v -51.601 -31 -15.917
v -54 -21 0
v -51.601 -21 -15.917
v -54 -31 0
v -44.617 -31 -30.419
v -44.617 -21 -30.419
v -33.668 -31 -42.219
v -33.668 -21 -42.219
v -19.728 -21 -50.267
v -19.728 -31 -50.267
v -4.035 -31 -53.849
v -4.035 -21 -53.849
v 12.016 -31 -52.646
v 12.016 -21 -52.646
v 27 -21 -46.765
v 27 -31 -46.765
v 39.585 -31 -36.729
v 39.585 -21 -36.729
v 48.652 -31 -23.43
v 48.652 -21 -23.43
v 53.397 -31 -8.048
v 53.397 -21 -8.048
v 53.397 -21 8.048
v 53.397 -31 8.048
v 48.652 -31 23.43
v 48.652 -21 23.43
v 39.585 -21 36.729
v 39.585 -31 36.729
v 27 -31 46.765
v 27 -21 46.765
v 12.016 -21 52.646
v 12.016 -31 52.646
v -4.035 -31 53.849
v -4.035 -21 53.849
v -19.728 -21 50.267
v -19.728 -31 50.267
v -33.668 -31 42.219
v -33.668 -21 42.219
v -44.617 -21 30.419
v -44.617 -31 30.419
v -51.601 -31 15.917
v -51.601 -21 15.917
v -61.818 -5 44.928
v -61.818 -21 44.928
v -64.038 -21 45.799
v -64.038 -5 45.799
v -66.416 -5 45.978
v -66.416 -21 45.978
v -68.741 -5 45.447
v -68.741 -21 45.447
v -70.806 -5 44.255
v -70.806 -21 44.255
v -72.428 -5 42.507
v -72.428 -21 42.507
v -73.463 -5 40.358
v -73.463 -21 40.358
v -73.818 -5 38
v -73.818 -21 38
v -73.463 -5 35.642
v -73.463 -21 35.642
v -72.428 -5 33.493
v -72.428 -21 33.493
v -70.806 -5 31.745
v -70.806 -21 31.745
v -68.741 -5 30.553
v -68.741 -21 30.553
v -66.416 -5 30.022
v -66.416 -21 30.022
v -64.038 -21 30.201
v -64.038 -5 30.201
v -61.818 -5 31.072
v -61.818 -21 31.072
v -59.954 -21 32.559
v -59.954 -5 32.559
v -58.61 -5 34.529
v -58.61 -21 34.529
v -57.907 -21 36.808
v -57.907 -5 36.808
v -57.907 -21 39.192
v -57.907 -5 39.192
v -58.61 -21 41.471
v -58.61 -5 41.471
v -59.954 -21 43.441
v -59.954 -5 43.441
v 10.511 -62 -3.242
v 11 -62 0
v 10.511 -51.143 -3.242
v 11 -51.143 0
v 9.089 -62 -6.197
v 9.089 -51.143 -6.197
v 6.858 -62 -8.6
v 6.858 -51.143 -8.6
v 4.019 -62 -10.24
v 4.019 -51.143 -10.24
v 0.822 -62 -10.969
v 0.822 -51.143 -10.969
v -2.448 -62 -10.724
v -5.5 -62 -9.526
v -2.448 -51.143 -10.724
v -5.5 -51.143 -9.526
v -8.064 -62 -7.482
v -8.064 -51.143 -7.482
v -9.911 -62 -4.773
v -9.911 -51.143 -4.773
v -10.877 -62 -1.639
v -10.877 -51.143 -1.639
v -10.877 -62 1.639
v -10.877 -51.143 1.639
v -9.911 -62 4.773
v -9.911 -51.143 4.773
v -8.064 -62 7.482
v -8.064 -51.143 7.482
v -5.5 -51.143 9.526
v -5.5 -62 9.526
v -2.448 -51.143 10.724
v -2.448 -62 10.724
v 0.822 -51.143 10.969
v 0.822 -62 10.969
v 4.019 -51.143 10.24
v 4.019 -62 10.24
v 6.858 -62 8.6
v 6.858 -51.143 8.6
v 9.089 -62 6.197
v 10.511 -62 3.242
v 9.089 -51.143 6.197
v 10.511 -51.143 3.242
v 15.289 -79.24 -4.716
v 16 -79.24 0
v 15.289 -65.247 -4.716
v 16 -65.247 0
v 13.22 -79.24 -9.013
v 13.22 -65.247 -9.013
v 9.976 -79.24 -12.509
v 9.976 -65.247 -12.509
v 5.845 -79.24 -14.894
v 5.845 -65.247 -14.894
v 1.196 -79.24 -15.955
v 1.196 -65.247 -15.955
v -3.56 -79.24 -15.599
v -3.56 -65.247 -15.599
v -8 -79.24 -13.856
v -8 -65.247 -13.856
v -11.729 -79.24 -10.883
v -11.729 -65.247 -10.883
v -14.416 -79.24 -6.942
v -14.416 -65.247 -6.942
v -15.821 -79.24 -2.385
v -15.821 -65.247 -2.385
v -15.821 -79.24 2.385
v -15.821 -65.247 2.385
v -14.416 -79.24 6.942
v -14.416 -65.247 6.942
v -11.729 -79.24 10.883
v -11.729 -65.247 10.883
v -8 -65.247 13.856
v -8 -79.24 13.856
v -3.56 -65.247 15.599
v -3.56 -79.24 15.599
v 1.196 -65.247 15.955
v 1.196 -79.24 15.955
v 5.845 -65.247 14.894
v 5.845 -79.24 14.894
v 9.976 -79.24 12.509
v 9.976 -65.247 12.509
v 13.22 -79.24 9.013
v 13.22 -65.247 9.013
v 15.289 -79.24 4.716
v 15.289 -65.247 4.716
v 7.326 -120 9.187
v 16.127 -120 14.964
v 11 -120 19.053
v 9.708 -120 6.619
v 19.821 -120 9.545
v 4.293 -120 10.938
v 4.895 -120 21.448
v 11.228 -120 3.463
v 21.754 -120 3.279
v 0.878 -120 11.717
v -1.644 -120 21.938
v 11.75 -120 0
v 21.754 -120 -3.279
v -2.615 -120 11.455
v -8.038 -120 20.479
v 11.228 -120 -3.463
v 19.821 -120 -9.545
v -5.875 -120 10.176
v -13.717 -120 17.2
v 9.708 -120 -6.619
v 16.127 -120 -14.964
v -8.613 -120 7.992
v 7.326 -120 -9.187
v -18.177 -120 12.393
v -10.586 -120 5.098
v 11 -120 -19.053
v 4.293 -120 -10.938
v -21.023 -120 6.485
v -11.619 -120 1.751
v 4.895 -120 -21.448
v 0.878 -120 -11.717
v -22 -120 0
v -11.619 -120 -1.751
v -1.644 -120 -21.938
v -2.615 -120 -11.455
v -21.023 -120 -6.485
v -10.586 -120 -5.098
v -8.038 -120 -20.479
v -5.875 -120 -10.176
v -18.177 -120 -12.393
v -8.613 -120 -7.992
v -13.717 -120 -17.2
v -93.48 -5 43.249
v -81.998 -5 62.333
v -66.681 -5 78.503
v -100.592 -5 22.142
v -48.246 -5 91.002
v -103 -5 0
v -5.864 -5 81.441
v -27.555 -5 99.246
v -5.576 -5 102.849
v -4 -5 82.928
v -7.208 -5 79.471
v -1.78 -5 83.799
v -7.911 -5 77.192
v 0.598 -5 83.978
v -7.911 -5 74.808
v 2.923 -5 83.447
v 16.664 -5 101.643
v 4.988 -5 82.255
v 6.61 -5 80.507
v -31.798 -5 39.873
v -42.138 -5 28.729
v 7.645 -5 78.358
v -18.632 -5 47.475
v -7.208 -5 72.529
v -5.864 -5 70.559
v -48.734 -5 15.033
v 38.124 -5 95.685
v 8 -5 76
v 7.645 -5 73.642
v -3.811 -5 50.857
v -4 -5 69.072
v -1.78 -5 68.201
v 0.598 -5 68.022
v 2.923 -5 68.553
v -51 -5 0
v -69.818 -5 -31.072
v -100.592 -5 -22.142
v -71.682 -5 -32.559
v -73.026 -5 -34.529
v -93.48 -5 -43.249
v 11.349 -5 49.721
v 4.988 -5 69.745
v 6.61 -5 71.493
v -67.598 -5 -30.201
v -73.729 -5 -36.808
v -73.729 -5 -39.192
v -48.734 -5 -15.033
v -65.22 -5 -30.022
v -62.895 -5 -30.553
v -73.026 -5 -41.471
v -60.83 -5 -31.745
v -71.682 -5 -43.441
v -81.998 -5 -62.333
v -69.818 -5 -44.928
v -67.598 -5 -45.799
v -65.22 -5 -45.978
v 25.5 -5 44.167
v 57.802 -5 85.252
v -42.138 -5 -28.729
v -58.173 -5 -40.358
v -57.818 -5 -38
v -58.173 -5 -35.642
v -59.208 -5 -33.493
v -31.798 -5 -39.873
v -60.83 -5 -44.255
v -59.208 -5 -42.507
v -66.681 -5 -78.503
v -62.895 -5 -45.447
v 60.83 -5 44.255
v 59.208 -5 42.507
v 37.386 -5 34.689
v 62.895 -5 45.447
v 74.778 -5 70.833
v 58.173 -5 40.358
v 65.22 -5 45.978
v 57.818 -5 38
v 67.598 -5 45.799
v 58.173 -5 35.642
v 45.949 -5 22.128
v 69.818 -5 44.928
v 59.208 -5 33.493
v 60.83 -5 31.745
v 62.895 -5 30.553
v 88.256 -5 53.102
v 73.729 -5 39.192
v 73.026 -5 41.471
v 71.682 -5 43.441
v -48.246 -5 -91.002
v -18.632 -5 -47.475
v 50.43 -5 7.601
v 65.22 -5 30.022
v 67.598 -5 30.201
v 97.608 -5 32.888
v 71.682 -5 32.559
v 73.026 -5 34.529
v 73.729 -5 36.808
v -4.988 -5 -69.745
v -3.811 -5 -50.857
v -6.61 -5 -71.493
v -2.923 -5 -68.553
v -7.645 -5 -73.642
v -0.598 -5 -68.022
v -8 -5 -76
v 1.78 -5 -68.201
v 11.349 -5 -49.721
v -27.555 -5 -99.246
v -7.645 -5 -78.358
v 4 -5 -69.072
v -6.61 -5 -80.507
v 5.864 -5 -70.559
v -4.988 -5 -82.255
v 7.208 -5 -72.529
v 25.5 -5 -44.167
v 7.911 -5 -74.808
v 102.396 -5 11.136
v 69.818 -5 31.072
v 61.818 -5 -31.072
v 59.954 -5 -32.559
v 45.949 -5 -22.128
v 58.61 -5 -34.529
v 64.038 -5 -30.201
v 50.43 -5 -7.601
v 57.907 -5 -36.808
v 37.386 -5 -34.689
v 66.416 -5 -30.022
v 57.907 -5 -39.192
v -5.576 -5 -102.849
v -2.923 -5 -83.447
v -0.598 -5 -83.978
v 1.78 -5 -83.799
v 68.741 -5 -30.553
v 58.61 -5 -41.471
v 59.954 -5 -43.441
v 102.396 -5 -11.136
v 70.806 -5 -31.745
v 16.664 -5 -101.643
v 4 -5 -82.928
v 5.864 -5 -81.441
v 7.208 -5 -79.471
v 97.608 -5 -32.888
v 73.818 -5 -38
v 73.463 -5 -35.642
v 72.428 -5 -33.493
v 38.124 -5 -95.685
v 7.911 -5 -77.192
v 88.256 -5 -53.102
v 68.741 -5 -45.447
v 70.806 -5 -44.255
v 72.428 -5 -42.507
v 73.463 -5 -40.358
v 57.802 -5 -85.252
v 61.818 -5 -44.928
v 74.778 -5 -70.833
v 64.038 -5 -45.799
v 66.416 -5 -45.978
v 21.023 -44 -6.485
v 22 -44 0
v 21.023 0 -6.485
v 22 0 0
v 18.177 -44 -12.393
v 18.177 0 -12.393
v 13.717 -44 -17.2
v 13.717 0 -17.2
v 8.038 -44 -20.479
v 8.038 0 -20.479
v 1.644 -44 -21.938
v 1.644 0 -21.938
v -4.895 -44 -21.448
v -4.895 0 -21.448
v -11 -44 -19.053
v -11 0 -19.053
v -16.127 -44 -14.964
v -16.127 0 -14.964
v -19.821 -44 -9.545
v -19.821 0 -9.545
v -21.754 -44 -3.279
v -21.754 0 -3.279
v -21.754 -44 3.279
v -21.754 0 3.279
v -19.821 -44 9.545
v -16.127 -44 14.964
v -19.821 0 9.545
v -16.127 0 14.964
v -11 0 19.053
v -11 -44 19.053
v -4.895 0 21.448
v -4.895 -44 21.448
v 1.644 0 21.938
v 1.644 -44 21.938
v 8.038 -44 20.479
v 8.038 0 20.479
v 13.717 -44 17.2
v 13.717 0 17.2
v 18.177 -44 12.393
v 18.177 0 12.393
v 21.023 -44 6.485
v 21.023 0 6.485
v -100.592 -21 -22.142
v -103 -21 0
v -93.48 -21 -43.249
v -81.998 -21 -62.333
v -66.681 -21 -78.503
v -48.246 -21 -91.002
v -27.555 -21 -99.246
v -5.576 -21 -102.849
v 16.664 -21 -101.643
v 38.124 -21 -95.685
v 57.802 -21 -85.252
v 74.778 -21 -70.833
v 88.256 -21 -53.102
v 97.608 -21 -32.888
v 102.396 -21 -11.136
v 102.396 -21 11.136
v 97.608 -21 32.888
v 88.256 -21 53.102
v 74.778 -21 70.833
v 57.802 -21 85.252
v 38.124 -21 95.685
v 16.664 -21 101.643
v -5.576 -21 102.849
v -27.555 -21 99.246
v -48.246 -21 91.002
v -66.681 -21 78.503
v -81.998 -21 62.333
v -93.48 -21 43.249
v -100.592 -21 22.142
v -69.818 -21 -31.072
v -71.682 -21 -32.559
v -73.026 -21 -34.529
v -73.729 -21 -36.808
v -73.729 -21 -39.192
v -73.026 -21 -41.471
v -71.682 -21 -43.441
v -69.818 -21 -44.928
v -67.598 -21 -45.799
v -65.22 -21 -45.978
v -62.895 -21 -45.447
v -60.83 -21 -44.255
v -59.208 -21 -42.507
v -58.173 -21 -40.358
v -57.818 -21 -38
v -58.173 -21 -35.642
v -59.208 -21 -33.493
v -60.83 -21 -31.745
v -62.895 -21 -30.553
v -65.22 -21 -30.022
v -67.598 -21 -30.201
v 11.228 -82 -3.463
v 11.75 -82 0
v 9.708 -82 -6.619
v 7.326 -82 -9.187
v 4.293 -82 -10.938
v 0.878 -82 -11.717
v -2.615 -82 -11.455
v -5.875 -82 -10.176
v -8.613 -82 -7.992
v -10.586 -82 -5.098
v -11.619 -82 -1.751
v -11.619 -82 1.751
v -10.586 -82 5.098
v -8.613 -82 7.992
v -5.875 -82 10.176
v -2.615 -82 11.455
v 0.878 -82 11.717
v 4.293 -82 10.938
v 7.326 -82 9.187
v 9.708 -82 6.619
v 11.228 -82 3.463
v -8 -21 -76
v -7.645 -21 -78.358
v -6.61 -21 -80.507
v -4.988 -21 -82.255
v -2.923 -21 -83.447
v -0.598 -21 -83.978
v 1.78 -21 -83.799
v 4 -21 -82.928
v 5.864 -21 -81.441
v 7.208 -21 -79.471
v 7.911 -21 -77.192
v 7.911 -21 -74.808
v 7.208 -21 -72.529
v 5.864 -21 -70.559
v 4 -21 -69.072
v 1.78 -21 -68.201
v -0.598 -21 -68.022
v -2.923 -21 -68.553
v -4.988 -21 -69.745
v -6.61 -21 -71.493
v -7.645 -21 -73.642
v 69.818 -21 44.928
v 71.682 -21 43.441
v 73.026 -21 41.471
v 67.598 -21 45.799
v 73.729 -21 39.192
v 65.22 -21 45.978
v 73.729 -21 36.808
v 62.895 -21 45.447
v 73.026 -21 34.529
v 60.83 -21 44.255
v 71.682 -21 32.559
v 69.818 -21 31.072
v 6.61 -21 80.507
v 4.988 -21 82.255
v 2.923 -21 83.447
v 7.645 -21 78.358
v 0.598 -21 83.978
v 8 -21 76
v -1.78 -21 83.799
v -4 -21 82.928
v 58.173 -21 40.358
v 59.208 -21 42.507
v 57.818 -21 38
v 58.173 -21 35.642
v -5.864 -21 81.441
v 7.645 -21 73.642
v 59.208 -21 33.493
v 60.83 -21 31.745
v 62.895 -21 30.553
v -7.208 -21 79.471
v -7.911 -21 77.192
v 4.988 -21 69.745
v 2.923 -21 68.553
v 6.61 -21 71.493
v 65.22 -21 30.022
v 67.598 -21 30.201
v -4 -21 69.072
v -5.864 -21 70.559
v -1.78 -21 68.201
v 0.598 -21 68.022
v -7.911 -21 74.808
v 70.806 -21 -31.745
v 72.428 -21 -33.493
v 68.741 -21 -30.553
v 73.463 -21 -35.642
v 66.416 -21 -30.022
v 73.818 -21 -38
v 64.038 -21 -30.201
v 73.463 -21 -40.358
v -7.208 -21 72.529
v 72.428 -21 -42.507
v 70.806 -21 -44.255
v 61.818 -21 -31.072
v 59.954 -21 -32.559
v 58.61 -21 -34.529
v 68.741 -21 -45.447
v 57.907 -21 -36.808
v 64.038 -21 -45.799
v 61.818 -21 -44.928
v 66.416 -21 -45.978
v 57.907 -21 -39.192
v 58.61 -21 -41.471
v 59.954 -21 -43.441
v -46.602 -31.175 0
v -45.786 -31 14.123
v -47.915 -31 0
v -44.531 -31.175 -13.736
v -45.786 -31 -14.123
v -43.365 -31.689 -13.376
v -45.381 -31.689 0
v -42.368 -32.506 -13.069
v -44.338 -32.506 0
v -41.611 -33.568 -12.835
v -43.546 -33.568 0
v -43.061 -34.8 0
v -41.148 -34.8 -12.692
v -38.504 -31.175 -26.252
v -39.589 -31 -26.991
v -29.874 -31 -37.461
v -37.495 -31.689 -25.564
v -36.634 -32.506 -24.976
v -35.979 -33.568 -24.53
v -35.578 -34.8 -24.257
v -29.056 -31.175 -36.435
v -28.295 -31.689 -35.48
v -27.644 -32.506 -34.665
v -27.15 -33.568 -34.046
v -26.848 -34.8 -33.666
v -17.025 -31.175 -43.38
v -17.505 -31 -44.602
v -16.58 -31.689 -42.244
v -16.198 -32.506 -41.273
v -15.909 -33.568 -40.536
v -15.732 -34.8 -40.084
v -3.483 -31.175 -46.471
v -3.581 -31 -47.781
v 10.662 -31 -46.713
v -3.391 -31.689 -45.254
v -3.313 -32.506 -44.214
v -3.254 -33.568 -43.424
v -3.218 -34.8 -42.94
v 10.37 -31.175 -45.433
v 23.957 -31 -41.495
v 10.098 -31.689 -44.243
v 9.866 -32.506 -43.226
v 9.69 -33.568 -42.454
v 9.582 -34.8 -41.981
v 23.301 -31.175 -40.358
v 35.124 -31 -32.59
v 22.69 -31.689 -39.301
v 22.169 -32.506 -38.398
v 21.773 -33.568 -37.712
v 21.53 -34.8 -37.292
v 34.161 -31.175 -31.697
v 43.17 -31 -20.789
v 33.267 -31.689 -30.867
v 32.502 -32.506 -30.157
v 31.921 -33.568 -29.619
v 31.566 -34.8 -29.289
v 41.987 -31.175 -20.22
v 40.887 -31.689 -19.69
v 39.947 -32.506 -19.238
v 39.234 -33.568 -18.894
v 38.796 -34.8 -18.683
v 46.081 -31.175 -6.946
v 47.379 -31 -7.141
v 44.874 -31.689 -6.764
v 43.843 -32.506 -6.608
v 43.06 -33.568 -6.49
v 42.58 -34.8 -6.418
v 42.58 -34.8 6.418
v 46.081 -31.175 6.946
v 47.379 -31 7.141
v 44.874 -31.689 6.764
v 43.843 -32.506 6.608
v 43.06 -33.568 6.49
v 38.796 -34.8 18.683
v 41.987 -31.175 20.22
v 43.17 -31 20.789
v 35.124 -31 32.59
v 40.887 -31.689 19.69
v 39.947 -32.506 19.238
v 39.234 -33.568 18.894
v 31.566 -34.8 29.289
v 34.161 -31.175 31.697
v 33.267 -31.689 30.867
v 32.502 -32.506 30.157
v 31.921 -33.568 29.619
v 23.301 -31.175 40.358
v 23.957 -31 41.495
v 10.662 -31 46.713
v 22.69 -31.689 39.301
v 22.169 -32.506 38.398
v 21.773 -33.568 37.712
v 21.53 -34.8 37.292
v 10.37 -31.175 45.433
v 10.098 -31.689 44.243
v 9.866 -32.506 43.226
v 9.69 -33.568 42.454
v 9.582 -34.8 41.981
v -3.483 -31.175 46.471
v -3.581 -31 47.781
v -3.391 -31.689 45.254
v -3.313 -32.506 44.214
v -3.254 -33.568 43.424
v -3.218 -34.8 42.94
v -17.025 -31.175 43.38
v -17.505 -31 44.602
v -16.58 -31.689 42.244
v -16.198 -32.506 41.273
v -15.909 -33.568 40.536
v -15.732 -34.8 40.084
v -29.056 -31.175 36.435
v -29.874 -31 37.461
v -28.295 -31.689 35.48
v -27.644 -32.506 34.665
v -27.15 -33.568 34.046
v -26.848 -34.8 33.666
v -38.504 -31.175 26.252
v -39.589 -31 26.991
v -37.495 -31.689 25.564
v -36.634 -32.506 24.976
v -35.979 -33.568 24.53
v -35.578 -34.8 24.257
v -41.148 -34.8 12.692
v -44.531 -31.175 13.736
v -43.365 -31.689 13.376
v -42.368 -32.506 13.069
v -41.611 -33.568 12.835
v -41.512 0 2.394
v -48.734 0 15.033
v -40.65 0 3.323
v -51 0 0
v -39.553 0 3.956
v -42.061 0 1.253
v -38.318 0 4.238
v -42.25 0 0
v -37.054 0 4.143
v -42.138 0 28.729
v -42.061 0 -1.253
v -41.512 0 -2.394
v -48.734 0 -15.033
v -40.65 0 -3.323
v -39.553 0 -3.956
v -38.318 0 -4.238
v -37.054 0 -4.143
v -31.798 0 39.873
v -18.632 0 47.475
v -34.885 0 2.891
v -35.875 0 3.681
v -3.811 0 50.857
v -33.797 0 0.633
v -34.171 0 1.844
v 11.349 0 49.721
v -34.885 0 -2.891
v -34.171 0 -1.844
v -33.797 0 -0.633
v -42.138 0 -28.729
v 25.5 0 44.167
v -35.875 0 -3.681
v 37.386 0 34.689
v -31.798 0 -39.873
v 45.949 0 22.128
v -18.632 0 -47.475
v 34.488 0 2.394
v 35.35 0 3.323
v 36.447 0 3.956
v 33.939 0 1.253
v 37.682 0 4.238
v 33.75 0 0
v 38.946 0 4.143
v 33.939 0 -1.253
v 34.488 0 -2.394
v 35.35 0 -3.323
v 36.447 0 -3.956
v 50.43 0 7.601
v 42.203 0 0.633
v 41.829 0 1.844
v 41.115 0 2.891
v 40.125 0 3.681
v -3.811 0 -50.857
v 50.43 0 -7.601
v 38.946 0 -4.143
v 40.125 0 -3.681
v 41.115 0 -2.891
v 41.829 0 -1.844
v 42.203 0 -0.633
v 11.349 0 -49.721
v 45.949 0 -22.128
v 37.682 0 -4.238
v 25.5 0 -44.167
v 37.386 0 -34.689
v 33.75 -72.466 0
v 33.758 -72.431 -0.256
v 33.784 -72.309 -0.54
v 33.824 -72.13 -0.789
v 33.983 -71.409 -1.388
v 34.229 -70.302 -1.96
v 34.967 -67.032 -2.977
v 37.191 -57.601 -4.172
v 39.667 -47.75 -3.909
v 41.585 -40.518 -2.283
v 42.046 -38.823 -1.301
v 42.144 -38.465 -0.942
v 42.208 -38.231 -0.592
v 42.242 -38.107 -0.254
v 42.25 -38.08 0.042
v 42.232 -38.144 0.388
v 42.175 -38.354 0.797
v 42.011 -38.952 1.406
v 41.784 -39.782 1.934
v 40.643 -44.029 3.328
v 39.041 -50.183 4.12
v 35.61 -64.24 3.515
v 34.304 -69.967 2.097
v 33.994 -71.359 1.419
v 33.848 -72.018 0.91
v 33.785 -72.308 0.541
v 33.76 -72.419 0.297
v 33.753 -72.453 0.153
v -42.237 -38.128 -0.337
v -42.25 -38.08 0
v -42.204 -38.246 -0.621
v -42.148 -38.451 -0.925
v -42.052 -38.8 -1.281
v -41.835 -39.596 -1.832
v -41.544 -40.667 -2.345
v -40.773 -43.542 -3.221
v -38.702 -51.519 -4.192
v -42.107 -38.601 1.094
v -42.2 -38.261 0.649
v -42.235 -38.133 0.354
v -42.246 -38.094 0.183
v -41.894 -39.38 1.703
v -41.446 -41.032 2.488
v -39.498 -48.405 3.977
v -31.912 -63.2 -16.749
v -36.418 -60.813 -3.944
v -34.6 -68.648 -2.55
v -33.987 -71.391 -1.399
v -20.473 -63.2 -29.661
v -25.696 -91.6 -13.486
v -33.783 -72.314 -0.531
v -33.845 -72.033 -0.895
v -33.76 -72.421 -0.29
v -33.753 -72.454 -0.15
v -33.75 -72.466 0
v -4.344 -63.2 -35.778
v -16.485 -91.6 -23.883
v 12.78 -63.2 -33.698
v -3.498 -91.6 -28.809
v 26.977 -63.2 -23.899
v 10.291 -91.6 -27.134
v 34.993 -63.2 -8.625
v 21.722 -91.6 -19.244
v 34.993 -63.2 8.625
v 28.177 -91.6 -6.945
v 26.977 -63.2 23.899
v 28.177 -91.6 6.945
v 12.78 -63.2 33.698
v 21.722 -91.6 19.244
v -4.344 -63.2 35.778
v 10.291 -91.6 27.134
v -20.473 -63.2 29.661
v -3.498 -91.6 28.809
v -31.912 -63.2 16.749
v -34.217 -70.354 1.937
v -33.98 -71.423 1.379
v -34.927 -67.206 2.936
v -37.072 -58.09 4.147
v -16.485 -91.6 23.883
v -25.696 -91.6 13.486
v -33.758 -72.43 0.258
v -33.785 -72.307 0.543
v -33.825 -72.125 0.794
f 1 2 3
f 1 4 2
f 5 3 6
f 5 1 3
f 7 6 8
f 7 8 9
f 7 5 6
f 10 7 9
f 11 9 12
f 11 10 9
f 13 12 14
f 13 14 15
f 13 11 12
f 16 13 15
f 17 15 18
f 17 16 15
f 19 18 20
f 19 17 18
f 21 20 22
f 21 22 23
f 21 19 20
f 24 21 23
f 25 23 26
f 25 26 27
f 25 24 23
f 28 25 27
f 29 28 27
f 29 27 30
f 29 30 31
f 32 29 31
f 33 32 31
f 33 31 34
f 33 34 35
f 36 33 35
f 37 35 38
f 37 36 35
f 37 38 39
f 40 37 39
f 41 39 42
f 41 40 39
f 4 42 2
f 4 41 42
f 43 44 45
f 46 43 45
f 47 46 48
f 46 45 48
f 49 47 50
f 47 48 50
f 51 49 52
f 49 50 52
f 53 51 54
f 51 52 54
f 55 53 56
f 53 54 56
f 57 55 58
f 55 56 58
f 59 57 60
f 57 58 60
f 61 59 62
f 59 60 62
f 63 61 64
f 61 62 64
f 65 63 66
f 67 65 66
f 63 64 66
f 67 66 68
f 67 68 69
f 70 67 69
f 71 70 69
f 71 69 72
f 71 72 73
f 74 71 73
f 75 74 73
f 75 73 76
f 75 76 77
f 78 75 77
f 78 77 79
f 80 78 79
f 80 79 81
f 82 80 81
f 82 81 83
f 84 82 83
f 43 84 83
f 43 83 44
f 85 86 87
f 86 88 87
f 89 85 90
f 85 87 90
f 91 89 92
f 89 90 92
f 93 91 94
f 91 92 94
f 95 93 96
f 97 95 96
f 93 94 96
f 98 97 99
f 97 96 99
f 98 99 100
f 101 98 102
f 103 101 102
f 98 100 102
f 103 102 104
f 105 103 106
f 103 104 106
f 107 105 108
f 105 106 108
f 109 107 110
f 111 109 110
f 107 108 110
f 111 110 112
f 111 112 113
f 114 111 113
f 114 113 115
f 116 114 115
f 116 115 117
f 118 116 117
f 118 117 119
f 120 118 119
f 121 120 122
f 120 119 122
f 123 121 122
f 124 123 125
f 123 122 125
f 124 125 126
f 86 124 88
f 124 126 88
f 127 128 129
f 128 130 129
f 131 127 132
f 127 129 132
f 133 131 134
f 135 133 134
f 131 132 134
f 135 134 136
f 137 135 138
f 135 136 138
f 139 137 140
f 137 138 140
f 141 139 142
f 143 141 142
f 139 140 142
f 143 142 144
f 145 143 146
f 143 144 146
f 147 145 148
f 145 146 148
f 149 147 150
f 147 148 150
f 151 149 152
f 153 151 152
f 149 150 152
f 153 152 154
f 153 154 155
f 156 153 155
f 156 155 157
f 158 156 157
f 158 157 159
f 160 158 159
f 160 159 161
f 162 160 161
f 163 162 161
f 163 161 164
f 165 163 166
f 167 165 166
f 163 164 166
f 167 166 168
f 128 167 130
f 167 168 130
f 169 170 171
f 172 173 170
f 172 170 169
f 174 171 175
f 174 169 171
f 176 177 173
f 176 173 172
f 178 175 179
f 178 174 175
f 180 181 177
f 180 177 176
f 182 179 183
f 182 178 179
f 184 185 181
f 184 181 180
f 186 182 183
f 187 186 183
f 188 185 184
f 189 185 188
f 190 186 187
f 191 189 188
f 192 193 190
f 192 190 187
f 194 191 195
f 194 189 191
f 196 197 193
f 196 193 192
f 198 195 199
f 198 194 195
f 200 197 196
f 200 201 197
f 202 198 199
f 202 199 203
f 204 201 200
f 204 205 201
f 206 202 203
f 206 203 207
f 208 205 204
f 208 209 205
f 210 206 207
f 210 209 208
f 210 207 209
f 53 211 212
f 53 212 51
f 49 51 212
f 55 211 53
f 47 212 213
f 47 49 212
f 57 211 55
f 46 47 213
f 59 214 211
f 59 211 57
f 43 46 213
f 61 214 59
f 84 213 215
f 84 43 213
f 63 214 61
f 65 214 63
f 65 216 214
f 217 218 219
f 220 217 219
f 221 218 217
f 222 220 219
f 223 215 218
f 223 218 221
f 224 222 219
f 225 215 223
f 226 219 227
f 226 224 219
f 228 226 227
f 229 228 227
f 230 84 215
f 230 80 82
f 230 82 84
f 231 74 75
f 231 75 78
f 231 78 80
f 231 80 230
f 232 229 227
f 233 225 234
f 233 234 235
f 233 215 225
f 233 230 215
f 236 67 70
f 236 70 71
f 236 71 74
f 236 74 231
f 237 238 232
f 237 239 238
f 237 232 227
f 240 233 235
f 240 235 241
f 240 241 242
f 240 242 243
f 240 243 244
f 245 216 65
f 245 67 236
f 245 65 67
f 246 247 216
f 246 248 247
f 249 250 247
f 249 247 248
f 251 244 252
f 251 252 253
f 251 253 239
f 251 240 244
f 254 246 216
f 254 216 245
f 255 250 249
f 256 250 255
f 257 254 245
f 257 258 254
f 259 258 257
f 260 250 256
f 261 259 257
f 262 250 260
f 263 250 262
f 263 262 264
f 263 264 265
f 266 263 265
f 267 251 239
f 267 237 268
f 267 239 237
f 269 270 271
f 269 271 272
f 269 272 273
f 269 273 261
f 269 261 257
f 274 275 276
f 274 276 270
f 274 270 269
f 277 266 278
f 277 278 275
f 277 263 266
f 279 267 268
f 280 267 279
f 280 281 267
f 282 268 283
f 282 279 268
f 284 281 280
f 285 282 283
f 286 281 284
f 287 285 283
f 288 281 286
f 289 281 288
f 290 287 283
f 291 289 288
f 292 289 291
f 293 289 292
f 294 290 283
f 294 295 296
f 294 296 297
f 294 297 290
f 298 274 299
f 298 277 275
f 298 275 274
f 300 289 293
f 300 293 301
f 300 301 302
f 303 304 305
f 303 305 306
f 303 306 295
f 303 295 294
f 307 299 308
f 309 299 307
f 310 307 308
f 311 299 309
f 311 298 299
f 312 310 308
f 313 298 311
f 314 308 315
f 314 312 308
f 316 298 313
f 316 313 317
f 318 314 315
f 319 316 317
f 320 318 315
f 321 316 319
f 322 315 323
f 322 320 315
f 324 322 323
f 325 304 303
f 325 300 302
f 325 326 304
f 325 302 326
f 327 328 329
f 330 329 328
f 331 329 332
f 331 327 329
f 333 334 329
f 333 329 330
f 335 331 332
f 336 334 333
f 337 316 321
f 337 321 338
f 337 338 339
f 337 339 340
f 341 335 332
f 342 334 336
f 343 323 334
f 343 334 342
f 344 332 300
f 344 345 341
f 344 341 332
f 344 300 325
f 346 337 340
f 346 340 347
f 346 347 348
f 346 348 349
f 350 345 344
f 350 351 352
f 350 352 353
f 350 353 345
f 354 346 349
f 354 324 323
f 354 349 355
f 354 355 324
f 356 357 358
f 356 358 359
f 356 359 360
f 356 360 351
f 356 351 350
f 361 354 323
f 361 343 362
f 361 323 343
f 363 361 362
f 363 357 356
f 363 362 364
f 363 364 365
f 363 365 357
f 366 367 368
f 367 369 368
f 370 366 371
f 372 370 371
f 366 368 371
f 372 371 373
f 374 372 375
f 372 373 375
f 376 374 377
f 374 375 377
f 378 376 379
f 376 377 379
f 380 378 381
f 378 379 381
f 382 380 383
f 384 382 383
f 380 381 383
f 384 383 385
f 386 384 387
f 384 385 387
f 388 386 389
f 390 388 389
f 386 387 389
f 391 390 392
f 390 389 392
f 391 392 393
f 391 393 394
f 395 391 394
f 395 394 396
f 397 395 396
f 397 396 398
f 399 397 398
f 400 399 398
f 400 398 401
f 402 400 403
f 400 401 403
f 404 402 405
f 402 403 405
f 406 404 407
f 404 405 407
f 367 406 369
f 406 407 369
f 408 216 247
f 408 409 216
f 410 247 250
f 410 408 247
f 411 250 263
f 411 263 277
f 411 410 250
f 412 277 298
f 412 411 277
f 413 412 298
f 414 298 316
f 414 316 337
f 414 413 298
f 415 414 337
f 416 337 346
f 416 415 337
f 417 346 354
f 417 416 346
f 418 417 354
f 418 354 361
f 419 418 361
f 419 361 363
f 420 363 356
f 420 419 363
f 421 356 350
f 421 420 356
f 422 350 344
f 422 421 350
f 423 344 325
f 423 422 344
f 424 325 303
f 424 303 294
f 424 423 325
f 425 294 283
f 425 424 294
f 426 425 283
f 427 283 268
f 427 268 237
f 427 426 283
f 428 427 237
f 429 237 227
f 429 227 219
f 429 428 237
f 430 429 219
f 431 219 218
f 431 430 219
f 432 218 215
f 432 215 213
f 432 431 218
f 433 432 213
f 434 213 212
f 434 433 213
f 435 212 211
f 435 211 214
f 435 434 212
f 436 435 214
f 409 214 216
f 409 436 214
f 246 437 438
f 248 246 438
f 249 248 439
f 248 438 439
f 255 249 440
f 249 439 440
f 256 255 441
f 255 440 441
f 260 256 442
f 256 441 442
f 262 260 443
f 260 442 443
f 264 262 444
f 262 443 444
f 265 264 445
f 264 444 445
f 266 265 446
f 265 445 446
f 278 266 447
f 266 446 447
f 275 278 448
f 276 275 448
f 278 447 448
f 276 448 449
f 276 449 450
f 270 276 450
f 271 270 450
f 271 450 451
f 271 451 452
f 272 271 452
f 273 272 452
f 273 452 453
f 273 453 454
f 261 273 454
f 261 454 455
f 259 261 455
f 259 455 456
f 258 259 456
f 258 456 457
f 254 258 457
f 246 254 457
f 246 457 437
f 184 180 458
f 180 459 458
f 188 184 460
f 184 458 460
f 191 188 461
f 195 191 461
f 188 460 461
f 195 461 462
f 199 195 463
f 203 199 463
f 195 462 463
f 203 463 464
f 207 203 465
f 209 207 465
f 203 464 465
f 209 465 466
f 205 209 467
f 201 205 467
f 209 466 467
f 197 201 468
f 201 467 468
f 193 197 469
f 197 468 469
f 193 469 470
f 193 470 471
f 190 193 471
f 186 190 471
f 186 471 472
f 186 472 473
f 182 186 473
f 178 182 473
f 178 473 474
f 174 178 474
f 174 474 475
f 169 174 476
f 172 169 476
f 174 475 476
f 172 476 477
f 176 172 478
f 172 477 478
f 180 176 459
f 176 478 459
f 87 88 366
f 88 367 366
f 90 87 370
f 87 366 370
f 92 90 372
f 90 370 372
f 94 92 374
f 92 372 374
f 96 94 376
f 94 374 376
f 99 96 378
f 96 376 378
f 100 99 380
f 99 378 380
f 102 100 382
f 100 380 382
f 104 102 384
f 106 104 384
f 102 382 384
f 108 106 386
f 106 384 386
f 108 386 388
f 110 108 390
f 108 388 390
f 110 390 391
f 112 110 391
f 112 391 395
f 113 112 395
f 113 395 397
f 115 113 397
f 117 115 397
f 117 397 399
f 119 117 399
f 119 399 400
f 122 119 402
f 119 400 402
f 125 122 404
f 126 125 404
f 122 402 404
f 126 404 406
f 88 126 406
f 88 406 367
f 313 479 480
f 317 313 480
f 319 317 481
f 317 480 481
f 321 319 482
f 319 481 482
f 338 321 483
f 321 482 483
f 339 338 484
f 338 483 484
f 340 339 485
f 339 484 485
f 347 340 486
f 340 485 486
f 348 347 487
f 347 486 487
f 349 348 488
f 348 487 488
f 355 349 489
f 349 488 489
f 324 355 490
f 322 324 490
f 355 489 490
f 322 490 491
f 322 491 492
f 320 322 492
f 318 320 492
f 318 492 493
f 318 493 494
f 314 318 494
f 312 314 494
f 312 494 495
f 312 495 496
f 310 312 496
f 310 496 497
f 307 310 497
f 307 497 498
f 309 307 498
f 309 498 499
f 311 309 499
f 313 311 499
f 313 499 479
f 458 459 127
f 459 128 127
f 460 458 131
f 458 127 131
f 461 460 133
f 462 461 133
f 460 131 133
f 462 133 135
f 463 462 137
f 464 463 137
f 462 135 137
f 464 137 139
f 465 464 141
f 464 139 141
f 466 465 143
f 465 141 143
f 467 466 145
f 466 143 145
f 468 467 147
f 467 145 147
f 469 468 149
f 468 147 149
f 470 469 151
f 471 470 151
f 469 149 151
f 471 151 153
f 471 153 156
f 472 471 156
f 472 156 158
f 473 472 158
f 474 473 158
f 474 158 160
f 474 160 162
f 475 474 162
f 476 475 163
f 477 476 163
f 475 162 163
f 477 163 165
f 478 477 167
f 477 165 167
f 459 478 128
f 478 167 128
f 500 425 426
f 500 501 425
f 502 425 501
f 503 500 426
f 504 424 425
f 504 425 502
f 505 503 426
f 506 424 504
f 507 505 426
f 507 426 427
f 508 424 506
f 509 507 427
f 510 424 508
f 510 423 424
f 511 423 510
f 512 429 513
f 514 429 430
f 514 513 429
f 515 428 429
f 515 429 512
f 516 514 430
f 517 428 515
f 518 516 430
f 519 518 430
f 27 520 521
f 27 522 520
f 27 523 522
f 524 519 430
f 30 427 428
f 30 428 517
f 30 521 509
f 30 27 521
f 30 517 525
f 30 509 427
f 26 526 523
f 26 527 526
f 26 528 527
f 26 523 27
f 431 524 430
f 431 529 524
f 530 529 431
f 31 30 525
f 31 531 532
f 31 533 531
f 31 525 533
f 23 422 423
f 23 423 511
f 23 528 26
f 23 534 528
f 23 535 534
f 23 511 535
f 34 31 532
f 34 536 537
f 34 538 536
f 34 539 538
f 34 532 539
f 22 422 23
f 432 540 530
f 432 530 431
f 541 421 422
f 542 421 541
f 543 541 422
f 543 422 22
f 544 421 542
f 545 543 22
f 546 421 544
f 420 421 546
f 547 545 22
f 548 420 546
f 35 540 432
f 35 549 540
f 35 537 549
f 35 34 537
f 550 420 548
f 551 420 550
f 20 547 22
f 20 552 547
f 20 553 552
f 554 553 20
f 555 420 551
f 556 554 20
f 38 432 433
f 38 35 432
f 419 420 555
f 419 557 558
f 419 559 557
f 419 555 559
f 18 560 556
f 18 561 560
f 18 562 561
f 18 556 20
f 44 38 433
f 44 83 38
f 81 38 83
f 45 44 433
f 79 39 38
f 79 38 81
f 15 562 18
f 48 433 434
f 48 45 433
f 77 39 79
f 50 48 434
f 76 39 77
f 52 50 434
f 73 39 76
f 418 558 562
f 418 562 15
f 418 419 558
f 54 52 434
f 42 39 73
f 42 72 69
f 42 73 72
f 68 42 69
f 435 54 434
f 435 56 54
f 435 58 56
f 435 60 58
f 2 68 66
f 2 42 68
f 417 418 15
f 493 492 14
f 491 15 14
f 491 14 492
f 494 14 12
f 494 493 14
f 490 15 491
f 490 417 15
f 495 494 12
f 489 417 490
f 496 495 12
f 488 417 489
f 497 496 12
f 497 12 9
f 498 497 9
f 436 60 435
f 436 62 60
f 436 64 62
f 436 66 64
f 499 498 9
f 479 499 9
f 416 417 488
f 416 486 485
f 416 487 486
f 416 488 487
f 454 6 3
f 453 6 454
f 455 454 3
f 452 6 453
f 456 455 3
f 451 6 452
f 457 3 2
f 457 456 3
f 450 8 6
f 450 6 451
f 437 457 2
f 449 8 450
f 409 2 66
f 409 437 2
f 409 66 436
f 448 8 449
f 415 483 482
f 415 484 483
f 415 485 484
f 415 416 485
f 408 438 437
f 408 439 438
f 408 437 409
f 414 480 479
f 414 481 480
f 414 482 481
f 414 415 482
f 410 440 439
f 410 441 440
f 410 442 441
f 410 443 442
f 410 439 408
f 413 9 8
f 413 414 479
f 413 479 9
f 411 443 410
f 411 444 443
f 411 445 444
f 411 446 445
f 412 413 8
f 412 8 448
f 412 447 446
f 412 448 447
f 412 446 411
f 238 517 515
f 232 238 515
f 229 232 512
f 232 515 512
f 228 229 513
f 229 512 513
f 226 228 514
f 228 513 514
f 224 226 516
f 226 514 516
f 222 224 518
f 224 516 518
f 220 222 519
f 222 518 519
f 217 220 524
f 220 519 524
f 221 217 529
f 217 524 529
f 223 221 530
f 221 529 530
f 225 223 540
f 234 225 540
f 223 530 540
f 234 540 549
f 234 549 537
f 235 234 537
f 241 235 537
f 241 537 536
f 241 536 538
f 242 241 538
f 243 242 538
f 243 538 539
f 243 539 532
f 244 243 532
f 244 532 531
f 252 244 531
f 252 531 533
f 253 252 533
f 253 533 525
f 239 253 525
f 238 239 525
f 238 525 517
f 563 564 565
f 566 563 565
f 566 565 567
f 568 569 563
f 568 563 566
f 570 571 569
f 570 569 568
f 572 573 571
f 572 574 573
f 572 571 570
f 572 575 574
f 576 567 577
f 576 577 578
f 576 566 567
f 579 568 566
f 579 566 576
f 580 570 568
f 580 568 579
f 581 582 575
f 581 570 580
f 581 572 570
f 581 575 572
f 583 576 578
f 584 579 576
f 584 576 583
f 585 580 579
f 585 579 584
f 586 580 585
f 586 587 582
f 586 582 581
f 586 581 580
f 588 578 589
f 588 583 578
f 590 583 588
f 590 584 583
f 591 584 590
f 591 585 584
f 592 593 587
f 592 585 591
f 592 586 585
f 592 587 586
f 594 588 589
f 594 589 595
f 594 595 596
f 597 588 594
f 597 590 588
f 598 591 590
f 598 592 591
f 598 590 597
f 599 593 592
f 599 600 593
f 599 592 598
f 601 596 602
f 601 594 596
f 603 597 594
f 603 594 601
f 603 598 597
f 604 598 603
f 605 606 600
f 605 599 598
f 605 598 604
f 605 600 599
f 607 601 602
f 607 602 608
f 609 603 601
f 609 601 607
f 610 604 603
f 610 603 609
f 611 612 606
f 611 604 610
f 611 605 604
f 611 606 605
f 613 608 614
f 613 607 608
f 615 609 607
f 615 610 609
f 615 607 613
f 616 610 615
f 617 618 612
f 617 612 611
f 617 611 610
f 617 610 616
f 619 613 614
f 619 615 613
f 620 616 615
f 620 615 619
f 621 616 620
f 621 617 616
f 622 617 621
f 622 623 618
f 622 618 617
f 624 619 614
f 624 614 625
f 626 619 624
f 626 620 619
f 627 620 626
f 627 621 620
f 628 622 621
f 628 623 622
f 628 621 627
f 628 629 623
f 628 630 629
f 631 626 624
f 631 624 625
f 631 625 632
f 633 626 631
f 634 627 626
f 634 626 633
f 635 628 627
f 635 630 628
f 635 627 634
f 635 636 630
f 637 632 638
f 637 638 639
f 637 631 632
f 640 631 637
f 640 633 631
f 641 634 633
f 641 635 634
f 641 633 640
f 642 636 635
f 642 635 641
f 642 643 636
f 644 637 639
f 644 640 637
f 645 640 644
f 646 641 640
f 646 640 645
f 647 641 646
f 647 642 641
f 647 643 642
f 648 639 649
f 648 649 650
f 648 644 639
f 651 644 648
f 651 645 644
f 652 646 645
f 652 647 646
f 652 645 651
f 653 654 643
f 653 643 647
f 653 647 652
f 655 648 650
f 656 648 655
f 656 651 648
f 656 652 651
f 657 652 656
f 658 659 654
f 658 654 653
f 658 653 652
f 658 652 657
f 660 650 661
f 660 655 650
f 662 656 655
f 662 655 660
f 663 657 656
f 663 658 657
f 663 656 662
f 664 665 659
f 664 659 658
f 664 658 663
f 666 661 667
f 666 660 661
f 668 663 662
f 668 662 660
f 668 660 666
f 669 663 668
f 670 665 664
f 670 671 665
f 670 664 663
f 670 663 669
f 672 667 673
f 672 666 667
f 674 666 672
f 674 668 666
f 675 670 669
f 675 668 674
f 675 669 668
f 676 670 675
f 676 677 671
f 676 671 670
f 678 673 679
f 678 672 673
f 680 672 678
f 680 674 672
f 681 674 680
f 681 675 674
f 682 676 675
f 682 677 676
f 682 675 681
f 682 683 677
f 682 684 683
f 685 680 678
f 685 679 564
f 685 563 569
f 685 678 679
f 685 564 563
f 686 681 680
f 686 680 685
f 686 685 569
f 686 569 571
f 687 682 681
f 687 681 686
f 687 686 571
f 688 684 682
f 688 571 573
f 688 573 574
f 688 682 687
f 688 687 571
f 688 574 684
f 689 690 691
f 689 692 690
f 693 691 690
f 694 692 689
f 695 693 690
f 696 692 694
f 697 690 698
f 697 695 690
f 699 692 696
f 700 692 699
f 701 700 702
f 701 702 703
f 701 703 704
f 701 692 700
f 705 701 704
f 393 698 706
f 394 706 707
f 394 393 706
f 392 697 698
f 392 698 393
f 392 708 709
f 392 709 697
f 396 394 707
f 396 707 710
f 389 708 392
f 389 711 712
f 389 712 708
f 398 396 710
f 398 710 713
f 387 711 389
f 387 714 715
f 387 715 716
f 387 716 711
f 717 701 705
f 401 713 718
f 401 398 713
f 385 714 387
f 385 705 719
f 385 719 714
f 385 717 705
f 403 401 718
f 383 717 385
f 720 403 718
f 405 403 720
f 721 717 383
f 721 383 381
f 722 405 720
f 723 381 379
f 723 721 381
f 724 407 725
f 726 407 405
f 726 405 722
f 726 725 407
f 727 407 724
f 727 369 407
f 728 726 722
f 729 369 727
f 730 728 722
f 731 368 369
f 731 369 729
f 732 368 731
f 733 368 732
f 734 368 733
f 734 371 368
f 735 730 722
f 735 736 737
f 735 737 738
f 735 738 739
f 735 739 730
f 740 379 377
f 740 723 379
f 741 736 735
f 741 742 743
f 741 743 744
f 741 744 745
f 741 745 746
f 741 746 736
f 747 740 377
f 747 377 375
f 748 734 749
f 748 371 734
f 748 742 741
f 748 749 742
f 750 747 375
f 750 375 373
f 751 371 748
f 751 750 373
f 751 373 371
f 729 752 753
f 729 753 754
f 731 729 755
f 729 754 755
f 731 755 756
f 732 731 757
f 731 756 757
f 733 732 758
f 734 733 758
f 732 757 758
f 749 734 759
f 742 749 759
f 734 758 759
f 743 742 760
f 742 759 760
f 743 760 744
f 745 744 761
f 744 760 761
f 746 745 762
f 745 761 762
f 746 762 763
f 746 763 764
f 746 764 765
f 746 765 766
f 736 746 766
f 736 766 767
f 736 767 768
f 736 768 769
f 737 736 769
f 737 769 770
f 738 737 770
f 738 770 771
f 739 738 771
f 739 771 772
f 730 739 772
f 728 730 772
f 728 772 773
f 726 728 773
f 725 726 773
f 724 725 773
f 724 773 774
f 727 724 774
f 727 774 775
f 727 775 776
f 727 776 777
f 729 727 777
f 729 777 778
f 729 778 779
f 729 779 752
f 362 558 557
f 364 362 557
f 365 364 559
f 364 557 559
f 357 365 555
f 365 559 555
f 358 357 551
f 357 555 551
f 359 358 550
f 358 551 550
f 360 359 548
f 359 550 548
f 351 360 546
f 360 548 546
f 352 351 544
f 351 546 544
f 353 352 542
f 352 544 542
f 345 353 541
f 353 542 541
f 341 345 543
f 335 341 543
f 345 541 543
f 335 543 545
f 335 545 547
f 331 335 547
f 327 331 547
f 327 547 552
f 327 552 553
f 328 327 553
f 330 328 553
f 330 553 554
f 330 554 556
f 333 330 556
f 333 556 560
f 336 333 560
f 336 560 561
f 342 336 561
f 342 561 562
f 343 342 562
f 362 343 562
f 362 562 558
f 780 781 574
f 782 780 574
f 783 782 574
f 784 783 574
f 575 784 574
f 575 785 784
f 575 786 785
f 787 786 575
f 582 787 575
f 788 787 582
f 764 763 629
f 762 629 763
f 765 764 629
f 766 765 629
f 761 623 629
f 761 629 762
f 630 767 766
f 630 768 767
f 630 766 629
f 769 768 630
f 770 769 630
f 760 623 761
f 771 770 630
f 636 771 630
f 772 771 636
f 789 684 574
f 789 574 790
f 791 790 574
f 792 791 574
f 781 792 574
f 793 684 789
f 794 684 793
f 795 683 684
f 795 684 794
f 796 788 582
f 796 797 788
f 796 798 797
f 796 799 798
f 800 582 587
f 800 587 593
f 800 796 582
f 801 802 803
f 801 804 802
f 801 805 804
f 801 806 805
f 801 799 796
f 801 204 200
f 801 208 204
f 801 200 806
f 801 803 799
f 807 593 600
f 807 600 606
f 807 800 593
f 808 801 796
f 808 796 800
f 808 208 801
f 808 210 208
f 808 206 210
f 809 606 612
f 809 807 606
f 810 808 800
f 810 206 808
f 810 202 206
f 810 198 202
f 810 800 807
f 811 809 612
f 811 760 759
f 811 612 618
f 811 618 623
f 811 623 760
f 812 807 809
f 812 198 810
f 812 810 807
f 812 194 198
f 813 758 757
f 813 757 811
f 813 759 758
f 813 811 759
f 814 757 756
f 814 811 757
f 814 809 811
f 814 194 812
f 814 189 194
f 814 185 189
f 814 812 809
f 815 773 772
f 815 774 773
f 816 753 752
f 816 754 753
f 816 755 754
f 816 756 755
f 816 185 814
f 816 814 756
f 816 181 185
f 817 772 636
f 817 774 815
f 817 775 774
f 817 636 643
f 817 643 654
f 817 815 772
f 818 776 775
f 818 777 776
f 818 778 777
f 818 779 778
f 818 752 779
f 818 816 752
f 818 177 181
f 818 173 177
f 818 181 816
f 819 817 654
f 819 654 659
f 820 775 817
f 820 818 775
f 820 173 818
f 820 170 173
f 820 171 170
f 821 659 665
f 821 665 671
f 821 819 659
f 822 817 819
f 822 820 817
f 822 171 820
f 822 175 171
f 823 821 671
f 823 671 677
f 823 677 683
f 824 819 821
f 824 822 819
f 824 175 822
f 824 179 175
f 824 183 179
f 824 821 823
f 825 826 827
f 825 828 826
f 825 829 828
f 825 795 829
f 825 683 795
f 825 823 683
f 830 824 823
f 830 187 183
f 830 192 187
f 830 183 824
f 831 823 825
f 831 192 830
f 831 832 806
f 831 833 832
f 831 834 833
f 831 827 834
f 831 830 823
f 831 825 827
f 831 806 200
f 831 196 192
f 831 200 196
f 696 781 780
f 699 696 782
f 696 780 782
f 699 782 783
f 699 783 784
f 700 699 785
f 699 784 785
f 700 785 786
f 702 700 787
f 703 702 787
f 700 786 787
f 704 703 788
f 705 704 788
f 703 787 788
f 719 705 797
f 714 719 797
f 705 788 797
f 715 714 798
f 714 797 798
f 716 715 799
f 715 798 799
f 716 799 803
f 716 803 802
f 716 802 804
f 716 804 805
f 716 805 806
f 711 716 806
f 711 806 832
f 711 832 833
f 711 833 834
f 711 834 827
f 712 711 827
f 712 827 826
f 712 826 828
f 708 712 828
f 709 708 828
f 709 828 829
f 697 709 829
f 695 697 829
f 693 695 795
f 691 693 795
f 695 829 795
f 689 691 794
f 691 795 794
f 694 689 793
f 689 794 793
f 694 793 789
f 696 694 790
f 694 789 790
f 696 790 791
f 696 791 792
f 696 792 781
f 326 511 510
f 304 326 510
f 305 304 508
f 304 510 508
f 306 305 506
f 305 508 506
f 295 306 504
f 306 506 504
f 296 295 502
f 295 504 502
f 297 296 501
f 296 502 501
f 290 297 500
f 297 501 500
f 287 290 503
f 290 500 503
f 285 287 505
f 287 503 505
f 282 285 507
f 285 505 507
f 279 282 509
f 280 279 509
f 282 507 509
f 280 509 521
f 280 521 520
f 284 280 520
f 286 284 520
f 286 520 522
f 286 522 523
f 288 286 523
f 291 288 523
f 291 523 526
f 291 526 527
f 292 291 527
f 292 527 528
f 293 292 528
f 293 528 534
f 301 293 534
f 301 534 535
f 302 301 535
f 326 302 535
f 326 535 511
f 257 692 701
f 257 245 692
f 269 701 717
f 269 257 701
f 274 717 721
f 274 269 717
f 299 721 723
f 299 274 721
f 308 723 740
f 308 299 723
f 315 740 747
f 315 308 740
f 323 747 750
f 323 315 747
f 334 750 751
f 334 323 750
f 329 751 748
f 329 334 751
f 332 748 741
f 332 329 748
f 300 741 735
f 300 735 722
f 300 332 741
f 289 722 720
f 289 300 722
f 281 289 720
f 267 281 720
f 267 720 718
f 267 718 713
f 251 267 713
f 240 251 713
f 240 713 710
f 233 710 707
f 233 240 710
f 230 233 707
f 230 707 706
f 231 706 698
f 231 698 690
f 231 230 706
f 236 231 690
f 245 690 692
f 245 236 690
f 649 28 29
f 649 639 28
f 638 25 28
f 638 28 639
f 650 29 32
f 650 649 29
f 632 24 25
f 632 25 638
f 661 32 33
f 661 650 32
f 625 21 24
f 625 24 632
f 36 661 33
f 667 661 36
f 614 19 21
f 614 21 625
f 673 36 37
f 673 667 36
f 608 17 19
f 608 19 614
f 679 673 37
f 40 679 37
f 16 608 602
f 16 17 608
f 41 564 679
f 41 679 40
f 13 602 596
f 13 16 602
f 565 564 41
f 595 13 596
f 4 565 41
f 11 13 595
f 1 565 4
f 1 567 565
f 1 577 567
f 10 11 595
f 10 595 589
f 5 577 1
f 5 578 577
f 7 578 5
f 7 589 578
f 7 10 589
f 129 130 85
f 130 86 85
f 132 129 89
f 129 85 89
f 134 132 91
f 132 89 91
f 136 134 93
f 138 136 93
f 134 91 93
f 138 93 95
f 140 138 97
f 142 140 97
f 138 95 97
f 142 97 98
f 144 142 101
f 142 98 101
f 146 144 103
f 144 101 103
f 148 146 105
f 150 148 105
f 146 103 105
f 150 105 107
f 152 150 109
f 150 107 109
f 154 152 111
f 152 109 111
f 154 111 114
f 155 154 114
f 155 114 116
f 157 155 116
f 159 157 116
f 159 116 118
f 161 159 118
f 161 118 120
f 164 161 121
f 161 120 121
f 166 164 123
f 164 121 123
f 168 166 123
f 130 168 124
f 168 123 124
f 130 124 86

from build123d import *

# Parameters (mm, degrees)
FILLET1_R                 = 5
F_1_0_16_DIAMETER_HOLE1_D = 16
CIRPATTERN1_COUNT         = 6
M10X1_5_TAPPED_HOLE1_D    = 8.5


# Read off the part's stored shape, not the designer's step: Cut-Revolve-Thin1
with BuildPart() as part:
    # Sketch1 → Revolve1 (revolve)
    with BuildSketch(Plane.XY, mode=Mode.PRIVATE) as revolve1_sk:
        Polygon((0, 0), (51, 0), (51, -5), (103, -5), (103, -21), (54, -21), (54, -31), (44, -31), (22, -120), (0, -120), align=None)
    revolve(revolve1_sk.sketch.rotate(Axis((0, 0, 0), (0, -1, 0)), 180), axis=Axis((0, 0, 0), (0, -1, 0)))

    # Cut-Revolve-Thin1 outline → Cut-Revolve-Thin1 (revolve, cut)
    with BuildSketch(Plane.XY):
        Polygon((0, -120), (11.75, -120), (11.75, -82), (16, -79.240017729), (16, -65.247037966), (11, -62), (11, -51.143483525), (22, -44), (22, 0), (0, 0), align=None)
    revolve(axis=Axis((0, 0, 0), (0, 1, 0)), mode=Mode.SUBTRACT)

    # Fillet1
    fillet1_edges = [part.edges().sort_by_distance(p)[0] for p in [
        (44, -31, 0),
    ]]
    fillet(fillet1_edges, radius=FILLET1_R)

    # Ø1.0 (16) Diameter Hole1 (through all)
    with Locations(Plane(origin=(0, -5, 0), x_dir=(1, 0, 0), z_dir=(0, 1, 0))):
        with Locations((0, 76)):
            f_1_0_16_diameter_hole1 = Hole(F_1_0_16_DIAMETER_HOLE1_D / 2)

    # CirPattern1: Ø1.0 (16) Diameter Hole1 ×6 about axis
    cirpattern1_axis = Axis((0, 0, 0), (0, 1, 0))
    for i in range(1, CIRPATTERN1_COUNT):
        add(f_1_0_16_diameter_hole1.rotate(cirpattern1_axis, i * 360 / CIRPATTERN1_COUNT), mode=Mode.SUBTRACT)

    # M10x1.5 Tapped Hole1 (through all)
    with Locations(Plane(origin=(0, 0, 0), x_dir=(1, 0, 0), z_dir=(0, 1, 0))):
        with Locations((38, 0), (-38, 0)):
            Hole(M10X1_5_TAPPED_HOLE1_D / 2)


solid = part.part
